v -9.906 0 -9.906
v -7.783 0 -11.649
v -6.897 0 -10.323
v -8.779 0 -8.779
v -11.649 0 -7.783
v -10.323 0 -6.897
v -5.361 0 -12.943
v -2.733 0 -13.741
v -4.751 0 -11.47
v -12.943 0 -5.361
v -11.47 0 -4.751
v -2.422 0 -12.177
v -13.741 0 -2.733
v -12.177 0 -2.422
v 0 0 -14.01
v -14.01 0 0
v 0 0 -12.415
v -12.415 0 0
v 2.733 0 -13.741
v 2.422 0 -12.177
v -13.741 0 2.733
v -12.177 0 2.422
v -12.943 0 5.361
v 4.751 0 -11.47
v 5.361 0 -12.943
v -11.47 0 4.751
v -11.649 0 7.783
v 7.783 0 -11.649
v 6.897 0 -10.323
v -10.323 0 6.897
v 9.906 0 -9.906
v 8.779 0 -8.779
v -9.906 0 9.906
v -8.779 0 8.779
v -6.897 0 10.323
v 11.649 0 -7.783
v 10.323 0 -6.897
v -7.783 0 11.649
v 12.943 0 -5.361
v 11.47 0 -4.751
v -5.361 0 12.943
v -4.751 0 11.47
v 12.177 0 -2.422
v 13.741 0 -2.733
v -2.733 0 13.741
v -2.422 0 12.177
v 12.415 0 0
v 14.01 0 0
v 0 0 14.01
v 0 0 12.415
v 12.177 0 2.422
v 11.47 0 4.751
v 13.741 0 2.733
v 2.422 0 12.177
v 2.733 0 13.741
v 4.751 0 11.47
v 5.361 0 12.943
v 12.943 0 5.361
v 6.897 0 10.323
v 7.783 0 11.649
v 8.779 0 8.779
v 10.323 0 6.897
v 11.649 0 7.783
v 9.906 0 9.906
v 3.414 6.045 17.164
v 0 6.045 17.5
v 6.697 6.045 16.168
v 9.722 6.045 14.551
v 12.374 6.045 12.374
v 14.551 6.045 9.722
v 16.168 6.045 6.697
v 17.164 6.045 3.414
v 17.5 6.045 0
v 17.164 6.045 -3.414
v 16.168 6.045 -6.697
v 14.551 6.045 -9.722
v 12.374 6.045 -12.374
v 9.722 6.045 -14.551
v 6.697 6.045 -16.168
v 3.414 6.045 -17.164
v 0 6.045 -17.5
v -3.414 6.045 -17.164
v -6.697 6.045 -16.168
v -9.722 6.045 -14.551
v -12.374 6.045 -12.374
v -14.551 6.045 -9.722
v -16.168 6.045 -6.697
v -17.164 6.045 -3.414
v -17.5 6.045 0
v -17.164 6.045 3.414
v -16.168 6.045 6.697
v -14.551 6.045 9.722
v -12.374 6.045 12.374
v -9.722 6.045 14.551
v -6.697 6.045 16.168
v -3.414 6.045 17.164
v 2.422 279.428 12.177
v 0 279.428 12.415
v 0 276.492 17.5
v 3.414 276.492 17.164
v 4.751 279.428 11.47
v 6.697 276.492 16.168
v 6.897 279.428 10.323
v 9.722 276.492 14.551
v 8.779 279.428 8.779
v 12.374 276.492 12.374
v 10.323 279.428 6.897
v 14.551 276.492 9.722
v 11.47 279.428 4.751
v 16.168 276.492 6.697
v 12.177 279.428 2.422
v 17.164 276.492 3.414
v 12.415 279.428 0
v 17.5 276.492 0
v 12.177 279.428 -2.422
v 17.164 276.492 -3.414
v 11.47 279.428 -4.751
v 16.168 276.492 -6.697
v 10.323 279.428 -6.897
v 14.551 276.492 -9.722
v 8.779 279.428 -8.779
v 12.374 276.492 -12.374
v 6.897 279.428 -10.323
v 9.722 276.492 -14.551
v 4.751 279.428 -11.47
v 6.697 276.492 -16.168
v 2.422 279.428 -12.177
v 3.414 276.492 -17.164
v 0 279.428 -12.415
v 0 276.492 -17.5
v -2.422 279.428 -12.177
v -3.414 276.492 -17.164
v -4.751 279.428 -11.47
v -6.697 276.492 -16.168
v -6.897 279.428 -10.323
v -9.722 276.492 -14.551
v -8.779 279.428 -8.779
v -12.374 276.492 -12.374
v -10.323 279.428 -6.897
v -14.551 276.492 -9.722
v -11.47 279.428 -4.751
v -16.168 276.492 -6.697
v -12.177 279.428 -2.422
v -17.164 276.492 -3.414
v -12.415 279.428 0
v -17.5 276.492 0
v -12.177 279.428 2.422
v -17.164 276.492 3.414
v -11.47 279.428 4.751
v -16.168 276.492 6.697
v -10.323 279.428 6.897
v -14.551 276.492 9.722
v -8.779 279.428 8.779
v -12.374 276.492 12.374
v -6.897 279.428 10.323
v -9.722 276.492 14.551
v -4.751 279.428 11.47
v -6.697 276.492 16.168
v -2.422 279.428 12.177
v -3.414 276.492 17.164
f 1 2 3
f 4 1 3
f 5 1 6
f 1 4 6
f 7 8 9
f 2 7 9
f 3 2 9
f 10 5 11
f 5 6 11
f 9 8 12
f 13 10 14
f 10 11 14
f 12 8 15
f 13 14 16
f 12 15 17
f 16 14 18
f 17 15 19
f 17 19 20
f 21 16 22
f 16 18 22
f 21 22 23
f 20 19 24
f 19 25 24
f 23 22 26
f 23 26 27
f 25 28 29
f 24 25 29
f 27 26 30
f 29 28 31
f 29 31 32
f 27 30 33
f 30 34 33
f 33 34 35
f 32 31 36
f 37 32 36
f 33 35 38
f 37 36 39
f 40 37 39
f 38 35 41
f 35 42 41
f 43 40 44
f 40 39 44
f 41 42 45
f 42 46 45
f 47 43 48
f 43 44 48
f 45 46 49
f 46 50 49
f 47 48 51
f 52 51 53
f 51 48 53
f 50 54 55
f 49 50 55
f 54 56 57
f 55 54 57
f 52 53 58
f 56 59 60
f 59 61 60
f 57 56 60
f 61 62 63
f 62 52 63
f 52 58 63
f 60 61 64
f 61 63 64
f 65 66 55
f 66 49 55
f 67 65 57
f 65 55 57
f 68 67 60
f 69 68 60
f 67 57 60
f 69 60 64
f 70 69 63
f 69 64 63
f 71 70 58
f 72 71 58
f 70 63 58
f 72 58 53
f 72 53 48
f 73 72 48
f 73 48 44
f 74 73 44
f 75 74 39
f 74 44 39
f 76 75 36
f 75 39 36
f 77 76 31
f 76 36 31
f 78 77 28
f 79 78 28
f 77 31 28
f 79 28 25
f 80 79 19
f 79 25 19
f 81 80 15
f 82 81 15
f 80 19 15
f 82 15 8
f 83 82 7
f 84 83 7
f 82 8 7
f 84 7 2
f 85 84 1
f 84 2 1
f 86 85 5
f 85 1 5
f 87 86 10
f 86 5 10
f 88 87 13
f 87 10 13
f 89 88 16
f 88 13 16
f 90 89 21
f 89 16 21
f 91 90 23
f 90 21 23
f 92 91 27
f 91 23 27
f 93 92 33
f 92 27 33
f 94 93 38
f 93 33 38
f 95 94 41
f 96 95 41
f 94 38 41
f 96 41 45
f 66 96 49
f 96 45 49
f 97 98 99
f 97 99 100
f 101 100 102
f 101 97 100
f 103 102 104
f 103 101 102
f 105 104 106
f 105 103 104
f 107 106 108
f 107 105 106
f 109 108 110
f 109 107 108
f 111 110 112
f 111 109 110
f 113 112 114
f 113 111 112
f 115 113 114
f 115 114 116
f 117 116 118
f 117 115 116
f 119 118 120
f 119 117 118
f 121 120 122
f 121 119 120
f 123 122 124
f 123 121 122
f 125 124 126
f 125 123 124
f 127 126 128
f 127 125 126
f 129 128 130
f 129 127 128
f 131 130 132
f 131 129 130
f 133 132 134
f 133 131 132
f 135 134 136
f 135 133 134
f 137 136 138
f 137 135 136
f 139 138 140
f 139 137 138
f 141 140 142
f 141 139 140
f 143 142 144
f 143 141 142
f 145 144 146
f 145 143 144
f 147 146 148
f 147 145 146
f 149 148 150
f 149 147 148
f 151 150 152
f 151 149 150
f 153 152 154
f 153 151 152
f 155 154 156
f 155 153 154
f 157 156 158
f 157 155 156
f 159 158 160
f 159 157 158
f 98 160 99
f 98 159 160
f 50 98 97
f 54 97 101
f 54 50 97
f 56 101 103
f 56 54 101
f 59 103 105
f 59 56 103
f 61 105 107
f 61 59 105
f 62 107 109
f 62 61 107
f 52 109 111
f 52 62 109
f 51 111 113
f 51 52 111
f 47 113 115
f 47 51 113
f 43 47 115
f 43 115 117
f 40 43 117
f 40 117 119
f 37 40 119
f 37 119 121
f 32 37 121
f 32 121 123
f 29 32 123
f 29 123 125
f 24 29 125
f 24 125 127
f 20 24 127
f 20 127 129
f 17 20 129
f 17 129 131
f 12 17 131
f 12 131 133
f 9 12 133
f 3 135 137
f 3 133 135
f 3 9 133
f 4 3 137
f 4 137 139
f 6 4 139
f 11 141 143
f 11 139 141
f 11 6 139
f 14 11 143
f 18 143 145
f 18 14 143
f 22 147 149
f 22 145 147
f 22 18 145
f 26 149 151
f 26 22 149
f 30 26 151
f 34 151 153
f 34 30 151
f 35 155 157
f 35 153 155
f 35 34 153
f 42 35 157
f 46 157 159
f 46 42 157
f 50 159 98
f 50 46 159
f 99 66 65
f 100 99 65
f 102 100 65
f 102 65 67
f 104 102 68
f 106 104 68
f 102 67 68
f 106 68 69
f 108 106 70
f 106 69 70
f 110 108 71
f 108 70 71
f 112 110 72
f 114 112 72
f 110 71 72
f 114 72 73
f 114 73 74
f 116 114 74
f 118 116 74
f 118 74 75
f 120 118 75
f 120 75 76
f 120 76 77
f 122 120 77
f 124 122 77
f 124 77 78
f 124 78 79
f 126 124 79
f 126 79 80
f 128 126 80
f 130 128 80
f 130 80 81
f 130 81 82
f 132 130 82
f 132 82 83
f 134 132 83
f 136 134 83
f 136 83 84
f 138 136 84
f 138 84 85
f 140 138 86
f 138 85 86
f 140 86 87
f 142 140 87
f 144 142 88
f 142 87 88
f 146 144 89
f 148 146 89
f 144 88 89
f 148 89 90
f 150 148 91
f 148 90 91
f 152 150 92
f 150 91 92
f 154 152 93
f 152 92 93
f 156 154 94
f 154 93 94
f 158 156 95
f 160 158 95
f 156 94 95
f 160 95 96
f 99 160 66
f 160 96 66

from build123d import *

# Parameters (mm, degrees)
SKETCH1_R           = 17.5
BOSS_EXTRUDE1_DEPTH = 279.982262
SKETCH2_R           = 12.415069034
CUT_EXTRUDE1_DEPTH  = 282.073952964
CHAMFER1_SIZE       = 3.490287
CHAMFER1_SIZE_2     = 6.045354


with BuildPart() as part:
    # Sketch1 → Boss-Extrude1 (new body)
    with BuildSketch(Plane(origin=(0, 0, 0), x_dir=(1, 0, 0), z_dir=(0, 1, 0))):
        with Locations(Location((0, 0, 0), (0, 0, 270))):
            Circle(SKETCH1_R)
    extrude(amount=BOSS_EXTRUDE1_DEPTH)

    # Sketch2 → Cut-Extrude1 (cut, through all)
    with BuildSketch(Plane(origin=(0, 0, 0), x_dir=(1, 0, 0), z_dir=(0, 1, 0))):
        with Locations(Location((0, 0, 0), (0, 0, 270))):
            Circle(SKETCH2_R)
    extrude(amount=CUT_EXTRUDE1_DEPTH, mode=Mode.SUBTRACT)

    # Chamfer1
    # the kernel refuses this chamfer: 6.045354, 3.490287 mm, written as the material it takes off along each edge
    with BuildSketch(Plane(origin=(0, 279.982262, 0), x_dir=(0, 0, 1), z_dir=(-1, 0, 0))) as chamfer1_piece_1:
        Polygon((17.5, -CHAMFER1_SIZE), (17.5 - CHAMFER1_SIZE_2, 0), (17.5, 0), align=None)
    revolve(axis=Axis((0, 279.982262, 0), (0, 1, 0)), mode=Mode.SUBTRACT)
    with BuildSketch(Plane(origin=(0, 0, 0), x_dir=(0, 0, 1), z_dir=(-1, 0, 0))) as chamfer1_piece_2:
        Polygon((17.5, CHAMFER1_SIZE_2), (17.5 - CHAMFER1_SIZE, 0), (17.5, 0), align=None)
    revolve(axis=Axis((0, 0, 0), (0, 1, 0)), mode=Mode.SUBTRACT)


solid = part.part
